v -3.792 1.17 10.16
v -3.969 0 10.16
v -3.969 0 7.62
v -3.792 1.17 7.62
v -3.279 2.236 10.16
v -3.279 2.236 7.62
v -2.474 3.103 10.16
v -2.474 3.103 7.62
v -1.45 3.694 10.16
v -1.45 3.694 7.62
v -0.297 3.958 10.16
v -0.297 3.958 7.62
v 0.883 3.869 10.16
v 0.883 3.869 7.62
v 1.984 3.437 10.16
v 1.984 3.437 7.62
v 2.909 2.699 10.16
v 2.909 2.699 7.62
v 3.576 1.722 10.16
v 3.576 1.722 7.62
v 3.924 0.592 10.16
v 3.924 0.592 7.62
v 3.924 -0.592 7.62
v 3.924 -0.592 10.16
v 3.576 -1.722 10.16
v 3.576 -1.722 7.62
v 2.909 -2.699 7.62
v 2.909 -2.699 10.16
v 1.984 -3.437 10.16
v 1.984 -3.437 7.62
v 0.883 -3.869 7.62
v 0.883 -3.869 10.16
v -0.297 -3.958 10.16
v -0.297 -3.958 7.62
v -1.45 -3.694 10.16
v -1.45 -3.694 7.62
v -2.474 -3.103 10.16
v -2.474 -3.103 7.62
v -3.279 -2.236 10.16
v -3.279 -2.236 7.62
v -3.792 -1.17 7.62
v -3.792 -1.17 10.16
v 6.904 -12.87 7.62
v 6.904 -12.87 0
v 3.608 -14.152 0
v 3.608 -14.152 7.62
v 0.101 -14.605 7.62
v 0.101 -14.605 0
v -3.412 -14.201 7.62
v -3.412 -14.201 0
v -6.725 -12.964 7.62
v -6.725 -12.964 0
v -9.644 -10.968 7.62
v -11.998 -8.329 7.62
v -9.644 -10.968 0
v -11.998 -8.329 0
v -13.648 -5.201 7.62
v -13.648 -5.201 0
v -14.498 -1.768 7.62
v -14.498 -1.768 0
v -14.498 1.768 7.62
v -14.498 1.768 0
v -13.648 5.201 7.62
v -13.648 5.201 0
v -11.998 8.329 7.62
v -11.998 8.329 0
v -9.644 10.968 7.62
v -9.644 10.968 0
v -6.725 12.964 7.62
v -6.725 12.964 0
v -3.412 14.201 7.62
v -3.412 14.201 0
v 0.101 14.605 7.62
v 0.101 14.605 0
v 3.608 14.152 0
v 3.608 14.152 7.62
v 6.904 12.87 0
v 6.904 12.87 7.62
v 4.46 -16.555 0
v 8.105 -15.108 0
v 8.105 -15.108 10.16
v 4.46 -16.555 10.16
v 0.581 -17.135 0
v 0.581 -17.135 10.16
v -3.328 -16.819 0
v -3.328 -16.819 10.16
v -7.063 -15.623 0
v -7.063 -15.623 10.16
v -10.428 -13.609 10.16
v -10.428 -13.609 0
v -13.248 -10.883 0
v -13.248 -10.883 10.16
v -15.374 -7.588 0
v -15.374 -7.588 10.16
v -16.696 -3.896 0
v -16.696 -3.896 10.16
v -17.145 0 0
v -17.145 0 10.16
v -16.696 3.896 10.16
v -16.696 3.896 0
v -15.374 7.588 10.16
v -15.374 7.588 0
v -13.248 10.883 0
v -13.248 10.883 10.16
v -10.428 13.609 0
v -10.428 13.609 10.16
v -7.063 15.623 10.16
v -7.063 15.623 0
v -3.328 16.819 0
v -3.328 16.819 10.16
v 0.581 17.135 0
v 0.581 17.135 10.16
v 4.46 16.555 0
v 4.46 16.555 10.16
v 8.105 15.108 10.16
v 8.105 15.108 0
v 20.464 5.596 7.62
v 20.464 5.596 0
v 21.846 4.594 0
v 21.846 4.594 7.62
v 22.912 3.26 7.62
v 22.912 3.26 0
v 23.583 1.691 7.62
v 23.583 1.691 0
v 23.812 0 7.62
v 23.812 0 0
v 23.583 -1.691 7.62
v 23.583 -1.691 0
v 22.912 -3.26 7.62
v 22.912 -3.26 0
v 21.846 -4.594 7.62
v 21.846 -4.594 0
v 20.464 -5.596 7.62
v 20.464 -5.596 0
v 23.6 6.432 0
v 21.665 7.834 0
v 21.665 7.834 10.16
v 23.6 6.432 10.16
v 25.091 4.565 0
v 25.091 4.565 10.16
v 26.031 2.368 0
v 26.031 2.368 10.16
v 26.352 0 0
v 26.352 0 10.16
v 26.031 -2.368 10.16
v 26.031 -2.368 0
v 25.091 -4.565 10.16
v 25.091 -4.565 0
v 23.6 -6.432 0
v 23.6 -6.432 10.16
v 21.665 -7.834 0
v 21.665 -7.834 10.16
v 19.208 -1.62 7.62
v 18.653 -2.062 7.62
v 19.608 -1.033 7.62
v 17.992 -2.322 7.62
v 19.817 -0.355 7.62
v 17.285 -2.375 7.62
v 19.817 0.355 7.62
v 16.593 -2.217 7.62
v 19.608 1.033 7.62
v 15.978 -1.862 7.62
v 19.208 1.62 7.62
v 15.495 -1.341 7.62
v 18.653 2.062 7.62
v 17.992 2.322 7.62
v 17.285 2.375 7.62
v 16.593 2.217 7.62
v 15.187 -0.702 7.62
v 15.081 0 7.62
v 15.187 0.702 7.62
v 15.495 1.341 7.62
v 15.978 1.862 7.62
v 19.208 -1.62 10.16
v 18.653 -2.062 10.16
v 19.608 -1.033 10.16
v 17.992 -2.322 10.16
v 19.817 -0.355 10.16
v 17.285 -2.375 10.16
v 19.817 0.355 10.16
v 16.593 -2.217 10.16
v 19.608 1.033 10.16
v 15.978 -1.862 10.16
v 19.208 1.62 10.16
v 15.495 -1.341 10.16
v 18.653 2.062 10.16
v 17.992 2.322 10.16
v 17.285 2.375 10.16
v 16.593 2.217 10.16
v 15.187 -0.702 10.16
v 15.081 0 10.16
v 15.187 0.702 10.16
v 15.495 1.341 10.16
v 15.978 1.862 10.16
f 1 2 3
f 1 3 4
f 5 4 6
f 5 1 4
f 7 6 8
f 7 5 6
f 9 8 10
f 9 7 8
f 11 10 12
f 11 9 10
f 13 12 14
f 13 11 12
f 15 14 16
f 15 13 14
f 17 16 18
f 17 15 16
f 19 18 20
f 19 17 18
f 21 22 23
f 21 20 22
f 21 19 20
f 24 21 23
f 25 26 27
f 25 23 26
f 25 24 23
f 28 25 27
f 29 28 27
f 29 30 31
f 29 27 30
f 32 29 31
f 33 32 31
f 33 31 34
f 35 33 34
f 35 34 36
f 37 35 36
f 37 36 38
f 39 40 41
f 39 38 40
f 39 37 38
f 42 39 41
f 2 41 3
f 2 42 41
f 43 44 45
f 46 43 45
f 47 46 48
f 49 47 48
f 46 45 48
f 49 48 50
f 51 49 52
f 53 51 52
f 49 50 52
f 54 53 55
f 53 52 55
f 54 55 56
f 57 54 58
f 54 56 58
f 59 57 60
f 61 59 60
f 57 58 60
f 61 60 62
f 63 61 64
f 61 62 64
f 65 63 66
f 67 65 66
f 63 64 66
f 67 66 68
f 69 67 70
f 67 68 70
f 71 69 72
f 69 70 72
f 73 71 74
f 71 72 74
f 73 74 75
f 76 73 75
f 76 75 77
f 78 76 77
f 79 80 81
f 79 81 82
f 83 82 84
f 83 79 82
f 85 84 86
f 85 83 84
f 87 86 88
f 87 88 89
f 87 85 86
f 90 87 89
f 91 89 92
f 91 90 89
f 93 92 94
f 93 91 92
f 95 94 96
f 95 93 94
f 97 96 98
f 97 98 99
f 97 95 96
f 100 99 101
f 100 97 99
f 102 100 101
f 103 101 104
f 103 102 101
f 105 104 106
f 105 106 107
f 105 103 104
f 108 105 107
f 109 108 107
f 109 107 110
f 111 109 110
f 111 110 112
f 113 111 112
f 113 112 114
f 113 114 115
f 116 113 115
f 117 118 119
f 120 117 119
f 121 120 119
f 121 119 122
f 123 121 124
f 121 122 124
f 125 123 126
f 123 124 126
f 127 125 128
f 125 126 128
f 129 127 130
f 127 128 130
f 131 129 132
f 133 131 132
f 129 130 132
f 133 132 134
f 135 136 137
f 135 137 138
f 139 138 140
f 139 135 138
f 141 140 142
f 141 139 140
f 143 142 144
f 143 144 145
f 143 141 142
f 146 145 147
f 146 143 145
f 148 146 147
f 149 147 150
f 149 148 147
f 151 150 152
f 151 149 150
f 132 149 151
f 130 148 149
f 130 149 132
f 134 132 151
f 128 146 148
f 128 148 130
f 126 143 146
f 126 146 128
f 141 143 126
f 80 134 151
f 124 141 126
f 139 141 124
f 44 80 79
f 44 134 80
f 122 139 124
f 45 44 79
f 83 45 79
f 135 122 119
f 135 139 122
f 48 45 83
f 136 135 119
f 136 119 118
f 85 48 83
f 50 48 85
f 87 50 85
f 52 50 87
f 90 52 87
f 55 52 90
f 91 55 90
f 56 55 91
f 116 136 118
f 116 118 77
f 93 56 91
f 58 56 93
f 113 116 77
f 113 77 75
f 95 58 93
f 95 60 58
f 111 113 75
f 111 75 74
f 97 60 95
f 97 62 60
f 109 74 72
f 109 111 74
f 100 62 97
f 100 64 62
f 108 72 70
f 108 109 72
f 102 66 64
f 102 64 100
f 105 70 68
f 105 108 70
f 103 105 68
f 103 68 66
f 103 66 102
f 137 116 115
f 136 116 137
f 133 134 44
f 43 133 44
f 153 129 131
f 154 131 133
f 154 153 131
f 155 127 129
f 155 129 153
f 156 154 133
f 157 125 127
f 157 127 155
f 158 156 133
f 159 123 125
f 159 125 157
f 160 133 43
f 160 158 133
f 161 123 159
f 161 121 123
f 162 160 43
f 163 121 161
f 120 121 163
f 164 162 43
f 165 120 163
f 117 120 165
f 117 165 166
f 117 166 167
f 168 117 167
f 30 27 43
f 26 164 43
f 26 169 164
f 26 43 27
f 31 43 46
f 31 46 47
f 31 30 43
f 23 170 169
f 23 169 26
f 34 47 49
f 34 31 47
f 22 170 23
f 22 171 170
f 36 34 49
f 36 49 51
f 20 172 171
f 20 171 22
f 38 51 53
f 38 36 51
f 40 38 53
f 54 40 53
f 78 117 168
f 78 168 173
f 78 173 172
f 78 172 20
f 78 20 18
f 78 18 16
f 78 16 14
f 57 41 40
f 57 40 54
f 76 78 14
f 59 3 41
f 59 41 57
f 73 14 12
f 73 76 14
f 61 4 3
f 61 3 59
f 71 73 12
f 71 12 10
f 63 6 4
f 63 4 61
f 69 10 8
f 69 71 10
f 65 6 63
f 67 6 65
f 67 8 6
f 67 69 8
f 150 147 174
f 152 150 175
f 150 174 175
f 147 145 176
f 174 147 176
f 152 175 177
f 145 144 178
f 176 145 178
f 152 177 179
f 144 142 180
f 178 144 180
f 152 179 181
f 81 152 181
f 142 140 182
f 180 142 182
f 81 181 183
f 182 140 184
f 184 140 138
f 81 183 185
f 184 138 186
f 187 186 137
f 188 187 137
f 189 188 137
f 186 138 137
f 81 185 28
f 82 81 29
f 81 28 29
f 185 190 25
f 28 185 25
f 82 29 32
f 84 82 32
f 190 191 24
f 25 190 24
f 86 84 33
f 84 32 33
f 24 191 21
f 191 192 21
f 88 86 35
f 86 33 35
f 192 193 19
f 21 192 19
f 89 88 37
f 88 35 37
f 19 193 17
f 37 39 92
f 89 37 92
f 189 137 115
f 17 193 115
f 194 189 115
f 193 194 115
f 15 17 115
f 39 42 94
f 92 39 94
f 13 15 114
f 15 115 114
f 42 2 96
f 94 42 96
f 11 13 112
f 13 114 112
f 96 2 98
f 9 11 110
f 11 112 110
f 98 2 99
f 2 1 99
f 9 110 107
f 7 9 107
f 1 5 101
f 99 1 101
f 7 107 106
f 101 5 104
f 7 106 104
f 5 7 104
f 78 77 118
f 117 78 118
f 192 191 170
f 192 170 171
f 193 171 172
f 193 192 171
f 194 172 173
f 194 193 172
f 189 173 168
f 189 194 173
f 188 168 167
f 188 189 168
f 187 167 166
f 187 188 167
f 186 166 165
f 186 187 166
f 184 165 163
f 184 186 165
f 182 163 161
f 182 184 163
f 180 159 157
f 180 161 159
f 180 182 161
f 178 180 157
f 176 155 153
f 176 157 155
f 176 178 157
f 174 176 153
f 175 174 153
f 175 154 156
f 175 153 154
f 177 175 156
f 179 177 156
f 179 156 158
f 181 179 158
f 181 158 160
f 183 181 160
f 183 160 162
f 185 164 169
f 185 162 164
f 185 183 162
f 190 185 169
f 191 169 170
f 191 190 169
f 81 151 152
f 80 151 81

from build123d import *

# Parameters (mm, degrees)
BOSS_EXTRUDE1_DEPTH     = 10.16
CUT_EXTRUDE1_DEPTH      = 7.62
CUT_EXTRUDE2_DEPTH      = 33.349183626
CUT_EXTRUDE2_DEPTH_BACK = 33.349183626
SKETCH3_R               = 3.96875
SKETCH3_R_2             = 2.38125


with BuildPart() as part:
    # Sketch1 → Boss-Extrude1 (new body)
    with BuildSketch(Plane.XY):
        with BuildLine():
            Line((8.104909091, 15.108324647), (21.665045455, 7.833946113))
            ThreePointArc((21.665045455, 7.833946113), (26.3525, 0), (21.665045455, -7.833946113))
            Line((21.665045455, -7.833946113), (8.104909091, -15.108324647))
            ThreePointArc((8.104909091, -15.108324647), (-17.145, 0), (8.104909091, 15.108324647))
        make_face()
    extrude(amount=BOSS_EXTRUDE1_DEPTH)

    # Sketch2 → Cut-Extrude1 (cut)
    with BuildSketch(Plane.XY):
        with BuildLine():
            Line((6.904181818, 12.870054329), (20.464318182, 5.595675795))
            ThreePointArc((20.464318182, 5.595675795), (23.8125, 0), (20.464318182, -5.595675795))
            Line((20.464318182, -5.595675795), (6.904181818, -12.870054329))
            ThreePointArc((6.904181818, -12.870054329), (-14.605, 0), (6.904181818, 12.870054329))
        make_face()
    extrude(amount=CUT_EXTRUDE1_DEPTH, mode=Mode.SUBTRACT)

    # Sketch3 → Cut-Extrude2 (cut, two sides: drawn at the far end of the back side and taken through both)
    with BuildSketch(Plane(origin=(0, 0, 7.62), x_dir=(-1, 0, 0), z_dir=(0, 0, -1)).offset(-CUT_EXTRUDE2_DEPTH_BACK)):
        Circle(SKETCH3_R)
        with Locations((-17.4625, 0)):
            Circle(SKETCH3_R_2)
    extrude(amount=CUT_EXTRUDE2_DEPTH + CUT_EXTRUDE2_DEPTH_BACK, mode=Mode.SUBTRACT)


solid = part.part
